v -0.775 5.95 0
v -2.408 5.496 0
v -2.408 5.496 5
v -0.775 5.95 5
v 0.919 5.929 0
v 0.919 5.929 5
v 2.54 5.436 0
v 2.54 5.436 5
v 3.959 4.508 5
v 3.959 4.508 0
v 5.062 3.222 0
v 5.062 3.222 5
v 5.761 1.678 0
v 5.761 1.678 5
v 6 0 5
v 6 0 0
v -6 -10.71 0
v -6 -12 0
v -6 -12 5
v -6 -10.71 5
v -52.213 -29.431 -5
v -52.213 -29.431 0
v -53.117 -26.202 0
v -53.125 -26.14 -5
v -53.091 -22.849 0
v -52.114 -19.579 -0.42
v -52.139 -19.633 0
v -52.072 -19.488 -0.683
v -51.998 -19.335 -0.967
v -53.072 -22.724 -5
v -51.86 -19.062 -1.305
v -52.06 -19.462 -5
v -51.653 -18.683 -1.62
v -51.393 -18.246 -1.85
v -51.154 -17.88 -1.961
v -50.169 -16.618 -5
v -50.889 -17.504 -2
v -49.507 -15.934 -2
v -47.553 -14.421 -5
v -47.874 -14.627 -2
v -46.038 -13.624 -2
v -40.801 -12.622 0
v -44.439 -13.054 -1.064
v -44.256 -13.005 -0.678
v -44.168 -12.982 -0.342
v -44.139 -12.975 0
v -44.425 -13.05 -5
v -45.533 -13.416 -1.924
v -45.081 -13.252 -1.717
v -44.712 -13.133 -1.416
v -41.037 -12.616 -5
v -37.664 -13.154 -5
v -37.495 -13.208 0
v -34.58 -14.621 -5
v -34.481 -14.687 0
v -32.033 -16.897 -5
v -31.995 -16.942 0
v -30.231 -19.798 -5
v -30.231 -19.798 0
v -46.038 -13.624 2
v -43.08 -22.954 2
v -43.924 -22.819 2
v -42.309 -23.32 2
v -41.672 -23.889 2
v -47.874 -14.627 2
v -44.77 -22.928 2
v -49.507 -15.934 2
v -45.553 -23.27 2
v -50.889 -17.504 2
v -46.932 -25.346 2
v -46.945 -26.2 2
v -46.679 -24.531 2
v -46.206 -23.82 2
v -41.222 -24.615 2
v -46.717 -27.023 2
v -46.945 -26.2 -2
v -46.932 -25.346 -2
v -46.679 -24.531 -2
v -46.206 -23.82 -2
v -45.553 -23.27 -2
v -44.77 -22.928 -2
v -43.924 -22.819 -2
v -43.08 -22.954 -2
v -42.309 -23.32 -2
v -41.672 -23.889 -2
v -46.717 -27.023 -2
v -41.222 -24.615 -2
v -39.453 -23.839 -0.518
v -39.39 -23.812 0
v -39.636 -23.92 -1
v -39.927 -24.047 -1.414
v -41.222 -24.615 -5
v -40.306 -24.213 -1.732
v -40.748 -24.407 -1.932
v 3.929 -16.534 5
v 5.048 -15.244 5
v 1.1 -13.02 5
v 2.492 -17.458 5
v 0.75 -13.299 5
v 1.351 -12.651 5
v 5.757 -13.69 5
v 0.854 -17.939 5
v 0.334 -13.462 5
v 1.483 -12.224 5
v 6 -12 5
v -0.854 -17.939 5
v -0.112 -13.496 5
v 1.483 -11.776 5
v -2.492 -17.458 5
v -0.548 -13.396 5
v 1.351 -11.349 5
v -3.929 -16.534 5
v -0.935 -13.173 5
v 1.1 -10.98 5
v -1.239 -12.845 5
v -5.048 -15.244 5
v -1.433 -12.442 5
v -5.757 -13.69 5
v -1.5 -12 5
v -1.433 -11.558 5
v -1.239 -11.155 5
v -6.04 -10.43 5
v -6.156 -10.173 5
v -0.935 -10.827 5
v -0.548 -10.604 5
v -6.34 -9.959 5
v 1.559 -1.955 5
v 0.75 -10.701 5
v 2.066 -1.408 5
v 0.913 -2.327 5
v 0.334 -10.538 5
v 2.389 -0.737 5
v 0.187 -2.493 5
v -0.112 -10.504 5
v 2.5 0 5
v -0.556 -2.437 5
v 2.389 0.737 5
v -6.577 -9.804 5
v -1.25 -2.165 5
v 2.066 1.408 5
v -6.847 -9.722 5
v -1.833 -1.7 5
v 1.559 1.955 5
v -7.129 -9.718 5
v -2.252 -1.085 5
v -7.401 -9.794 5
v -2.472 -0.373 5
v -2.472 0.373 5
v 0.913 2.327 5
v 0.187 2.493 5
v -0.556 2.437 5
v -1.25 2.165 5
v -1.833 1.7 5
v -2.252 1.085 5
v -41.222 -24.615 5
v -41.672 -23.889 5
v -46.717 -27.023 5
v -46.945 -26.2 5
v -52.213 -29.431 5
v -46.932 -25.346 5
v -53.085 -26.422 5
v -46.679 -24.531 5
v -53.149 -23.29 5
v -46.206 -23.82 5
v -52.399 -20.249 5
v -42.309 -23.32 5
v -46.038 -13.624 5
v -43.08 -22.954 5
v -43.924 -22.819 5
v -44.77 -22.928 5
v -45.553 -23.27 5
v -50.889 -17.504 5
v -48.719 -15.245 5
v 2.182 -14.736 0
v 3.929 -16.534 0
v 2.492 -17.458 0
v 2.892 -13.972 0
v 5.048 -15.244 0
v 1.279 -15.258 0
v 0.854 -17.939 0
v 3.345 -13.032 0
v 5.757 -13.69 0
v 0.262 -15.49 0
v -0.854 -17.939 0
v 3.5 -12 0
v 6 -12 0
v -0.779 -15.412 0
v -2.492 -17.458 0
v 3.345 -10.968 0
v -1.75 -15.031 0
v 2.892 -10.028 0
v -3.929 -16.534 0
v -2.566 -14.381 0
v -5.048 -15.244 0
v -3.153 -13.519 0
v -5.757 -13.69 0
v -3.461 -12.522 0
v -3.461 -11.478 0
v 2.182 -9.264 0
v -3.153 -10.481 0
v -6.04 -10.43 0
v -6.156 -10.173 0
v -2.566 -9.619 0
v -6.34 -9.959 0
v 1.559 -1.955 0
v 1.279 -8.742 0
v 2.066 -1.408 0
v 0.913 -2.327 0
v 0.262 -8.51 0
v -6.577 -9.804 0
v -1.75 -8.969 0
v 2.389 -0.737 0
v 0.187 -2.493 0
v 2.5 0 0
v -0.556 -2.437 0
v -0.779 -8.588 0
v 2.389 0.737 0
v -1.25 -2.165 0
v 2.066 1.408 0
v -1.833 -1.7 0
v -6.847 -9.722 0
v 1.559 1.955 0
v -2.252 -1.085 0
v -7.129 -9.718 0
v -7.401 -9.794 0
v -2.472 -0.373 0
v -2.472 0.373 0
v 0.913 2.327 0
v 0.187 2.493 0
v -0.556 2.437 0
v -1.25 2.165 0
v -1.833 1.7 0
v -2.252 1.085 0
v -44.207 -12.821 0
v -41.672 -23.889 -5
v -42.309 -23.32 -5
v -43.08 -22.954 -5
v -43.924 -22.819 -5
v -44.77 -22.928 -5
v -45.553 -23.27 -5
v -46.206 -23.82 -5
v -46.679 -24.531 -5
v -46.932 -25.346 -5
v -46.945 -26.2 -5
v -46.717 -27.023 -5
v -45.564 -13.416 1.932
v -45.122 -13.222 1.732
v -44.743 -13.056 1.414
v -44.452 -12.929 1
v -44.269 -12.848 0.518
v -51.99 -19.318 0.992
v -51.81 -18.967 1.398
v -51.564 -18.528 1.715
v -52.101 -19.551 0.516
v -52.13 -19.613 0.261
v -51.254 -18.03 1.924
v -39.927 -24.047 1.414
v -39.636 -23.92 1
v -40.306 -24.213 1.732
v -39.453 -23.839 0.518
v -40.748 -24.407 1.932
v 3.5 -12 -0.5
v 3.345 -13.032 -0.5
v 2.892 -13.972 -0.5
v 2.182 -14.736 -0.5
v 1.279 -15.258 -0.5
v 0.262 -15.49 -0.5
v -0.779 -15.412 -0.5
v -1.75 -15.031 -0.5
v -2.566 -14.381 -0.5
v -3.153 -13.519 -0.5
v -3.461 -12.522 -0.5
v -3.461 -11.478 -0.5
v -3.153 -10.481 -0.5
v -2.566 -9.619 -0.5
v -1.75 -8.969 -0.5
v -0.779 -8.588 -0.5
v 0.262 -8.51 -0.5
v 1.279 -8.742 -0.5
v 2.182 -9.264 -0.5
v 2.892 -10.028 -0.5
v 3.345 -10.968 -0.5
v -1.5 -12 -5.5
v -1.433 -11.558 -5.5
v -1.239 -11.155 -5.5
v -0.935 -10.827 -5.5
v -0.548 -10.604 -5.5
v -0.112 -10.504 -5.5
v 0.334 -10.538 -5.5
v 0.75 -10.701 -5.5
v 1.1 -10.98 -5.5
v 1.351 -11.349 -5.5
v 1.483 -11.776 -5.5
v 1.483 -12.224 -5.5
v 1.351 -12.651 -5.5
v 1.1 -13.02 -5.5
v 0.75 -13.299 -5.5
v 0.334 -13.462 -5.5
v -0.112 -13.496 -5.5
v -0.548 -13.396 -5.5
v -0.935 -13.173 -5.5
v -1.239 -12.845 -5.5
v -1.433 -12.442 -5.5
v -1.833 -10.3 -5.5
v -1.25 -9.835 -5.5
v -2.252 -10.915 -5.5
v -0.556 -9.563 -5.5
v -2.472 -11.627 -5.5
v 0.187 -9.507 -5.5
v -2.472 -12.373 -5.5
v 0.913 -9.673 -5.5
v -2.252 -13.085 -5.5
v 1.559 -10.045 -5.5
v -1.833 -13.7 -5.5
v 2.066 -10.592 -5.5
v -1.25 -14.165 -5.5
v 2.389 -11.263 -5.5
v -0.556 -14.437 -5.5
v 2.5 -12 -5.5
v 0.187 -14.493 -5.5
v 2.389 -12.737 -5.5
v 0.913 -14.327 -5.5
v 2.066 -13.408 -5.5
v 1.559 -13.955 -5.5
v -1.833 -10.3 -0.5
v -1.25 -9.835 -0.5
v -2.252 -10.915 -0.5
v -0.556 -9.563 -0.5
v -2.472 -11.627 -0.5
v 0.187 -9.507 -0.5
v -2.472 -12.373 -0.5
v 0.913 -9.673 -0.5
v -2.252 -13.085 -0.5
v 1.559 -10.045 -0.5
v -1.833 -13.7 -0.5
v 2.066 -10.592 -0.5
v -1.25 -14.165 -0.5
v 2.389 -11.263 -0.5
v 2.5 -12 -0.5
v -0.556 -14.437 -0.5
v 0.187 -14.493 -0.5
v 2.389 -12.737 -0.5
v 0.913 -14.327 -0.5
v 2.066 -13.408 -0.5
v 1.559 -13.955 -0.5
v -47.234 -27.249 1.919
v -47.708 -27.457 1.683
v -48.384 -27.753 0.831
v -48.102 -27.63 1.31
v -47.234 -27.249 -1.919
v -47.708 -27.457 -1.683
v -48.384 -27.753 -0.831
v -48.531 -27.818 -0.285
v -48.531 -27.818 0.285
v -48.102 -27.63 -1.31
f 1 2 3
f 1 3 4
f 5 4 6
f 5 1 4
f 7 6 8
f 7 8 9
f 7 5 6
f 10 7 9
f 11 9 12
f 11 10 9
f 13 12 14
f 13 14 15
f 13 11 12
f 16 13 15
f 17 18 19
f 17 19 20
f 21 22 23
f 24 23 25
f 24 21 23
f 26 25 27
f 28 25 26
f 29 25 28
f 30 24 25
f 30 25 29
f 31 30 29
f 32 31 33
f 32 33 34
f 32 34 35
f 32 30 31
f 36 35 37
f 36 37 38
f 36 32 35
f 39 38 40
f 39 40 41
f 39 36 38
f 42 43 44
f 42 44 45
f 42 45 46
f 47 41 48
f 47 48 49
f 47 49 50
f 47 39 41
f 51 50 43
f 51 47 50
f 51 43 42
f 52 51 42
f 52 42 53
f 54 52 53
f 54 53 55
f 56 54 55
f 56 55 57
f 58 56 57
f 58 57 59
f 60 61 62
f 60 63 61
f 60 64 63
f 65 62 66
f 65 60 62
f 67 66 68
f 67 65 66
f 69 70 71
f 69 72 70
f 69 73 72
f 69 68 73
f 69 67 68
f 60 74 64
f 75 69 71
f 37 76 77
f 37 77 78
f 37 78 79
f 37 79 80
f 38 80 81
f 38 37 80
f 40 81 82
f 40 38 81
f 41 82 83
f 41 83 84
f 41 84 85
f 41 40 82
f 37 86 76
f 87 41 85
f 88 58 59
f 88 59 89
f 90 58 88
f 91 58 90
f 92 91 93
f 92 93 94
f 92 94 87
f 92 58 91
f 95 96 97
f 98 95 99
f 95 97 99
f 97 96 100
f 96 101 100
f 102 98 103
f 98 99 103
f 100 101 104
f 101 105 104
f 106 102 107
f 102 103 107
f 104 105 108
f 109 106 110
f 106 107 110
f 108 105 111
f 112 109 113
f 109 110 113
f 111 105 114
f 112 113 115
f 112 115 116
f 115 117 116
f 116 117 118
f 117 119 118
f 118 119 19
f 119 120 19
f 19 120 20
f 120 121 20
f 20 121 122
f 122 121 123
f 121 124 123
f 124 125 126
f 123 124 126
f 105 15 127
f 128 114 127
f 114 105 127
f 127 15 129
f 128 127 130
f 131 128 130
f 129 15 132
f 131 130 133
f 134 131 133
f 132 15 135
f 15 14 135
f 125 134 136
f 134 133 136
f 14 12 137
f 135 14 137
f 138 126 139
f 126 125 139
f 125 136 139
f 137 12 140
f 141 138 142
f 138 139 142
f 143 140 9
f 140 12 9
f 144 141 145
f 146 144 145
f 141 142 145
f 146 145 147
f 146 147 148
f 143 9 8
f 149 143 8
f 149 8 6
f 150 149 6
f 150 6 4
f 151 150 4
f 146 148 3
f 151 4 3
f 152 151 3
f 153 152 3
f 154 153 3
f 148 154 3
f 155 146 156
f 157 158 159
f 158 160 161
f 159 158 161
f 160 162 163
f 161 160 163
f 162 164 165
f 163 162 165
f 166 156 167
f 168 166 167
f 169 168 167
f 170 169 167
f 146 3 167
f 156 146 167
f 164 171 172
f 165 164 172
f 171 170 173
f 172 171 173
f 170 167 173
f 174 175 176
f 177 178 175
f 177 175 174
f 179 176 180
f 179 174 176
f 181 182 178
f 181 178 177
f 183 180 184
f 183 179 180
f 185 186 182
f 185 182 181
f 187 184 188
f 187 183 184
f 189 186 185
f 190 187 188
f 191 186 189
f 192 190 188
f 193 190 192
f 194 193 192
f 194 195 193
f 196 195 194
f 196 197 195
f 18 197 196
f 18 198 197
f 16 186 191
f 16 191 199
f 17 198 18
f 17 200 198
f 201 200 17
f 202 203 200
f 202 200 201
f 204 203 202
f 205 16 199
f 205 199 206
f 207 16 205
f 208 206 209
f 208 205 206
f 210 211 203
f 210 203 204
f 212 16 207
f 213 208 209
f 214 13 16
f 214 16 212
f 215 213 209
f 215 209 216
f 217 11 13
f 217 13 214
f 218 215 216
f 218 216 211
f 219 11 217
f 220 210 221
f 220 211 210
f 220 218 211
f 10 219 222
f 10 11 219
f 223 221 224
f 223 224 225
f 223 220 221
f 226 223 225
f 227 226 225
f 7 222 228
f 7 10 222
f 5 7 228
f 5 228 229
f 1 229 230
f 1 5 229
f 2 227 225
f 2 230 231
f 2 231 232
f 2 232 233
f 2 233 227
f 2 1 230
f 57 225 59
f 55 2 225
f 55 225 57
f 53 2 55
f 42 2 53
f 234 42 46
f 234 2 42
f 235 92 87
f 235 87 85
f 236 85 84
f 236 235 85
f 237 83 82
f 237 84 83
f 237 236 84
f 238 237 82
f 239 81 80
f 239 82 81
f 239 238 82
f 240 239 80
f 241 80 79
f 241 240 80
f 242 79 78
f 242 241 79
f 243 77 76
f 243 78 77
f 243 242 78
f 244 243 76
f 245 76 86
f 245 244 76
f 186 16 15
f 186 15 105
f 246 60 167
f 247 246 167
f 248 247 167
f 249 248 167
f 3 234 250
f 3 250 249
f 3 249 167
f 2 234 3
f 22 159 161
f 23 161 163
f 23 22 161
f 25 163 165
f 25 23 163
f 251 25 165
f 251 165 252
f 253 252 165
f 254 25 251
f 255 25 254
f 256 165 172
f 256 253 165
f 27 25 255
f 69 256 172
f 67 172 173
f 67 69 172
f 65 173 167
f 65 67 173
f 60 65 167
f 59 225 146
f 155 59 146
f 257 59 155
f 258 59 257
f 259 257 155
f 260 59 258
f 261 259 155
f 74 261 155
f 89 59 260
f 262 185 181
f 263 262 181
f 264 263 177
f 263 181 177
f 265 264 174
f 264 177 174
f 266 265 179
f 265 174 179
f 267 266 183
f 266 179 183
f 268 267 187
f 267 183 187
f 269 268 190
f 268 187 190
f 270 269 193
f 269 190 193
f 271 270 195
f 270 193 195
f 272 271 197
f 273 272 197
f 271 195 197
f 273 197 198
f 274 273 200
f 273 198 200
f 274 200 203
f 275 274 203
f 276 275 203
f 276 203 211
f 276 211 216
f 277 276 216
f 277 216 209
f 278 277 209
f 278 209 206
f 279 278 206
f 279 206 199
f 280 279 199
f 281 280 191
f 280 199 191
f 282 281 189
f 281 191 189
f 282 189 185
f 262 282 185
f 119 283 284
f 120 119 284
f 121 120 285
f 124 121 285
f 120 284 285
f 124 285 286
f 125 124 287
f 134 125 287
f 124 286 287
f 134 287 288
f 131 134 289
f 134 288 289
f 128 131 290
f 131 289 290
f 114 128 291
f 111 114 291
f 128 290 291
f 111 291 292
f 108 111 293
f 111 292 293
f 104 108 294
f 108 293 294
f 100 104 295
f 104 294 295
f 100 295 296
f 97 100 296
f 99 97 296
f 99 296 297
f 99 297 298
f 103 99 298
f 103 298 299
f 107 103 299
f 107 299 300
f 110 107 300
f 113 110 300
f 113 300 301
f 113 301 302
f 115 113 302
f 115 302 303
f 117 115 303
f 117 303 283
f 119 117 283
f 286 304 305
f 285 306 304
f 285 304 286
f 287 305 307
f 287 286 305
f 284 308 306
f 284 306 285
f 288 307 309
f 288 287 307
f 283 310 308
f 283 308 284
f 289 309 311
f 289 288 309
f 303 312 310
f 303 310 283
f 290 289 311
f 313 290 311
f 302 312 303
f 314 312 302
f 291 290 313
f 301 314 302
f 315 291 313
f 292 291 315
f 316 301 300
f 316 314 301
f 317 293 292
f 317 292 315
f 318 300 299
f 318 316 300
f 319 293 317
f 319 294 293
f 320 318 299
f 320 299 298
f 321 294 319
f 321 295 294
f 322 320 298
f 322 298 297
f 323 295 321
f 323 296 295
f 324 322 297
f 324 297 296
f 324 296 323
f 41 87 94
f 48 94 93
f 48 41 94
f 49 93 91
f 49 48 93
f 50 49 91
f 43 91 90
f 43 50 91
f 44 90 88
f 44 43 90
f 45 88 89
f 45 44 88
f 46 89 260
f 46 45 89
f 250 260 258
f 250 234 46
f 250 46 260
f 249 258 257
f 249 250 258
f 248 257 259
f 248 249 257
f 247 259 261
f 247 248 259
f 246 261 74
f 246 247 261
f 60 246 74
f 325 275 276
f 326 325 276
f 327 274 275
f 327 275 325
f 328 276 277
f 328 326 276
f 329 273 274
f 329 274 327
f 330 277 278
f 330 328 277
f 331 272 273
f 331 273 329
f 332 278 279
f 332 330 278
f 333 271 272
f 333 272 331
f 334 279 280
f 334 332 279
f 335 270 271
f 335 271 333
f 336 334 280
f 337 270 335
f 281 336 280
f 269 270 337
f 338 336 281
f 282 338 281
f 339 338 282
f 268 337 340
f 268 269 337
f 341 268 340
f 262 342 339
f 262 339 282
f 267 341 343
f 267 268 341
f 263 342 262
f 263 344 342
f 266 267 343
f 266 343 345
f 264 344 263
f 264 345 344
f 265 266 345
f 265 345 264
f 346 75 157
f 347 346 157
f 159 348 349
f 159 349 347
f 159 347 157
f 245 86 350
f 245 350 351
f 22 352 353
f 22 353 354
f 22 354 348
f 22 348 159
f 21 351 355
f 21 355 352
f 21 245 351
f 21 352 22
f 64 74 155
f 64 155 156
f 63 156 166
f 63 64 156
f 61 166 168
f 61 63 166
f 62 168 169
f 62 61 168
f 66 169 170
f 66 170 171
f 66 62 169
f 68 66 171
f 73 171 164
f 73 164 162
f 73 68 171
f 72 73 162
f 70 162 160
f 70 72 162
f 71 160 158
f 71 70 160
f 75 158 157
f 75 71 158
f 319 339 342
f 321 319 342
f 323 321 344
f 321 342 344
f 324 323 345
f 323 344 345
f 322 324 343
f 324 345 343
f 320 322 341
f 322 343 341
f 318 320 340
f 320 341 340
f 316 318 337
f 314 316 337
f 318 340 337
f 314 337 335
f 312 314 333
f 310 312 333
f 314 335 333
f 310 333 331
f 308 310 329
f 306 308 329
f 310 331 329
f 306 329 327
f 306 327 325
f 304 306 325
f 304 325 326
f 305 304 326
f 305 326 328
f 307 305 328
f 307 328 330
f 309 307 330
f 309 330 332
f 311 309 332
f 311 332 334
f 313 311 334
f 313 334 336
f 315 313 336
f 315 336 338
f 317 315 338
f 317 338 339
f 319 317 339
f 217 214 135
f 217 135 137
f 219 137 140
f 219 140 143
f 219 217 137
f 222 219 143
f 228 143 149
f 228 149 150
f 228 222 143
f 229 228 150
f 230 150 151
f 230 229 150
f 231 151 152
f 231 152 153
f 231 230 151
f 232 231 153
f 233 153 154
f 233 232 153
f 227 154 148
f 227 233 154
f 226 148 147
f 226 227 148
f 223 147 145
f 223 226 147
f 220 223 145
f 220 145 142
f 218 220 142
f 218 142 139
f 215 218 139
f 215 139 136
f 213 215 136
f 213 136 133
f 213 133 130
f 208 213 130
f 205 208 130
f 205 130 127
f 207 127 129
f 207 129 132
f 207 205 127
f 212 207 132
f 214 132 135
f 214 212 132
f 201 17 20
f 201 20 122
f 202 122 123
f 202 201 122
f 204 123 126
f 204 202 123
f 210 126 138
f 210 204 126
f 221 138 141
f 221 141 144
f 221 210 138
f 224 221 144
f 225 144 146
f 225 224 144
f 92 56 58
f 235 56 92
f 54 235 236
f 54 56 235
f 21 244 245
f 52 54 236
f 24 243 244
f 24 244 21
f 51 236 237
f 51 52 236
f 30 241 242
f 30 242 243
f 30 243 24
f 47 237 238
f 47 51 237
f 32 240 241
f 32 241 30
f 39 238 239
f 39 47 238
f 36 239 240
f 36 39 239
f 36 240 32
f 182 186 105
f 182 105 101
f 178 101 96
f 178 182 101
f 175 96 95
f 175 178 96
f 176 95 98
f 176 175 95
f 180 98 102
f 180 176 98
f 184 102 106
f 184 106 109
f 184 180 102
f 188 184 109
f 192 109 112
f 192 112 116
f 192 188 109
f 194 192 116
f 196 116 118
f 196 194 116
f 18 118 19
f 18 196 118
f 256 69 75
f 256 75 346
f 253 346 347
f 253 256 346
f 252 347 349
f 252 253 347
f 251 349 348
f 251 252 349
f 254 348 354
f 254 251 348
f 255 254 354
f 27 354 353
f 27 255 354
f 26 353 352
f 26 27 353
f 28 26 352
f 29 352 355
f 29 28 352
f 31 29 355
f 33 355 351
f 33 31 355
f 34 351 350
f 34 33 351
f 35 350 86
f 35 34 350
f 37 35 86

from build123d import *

# Parameters (mm, degrees)
ESBO_O7_R                = 2.5
RESSALTO_EXTRUS_O1_DEPTH = 5
ESBO_O8_R                = 2.5
RESSALTO_EXTRUS_O2_DEPTH = 5.5
ESBO_O9_R                = 1.5
CORTE_EXTRUS_O4_DEPTH    = 25
RESSALTO_EXTRUS_O3_START = 5
RESSALTO_EXTRUS_O3_DEPTH = 5
CORTE_EXTRUS_O5_DEPTH    = 16
SKETCH1_R                = 3.5
SKETCH1_R_2              = 2.5
BOSS_EXTRUDE1_DEPTH      = 0.5


with BuildPart() as part:
    # Esboço7 → Ressalto-extrusão1 (new body)
    with BuildSketch(Plane.XY):
        with BuildLine():
            Line((6, 0), (6, -12))
            ThreePointArc((6, -12), (0, -18), (-6, -12))
            Line((-6, -12), (-6, -10.710094321))
            ThreePointArc((-6, -10.710094321), (-6.452901427, -9.873026133), (-7.401366303, -9.794176699))
            Line((-7.401366303, -9.794176699), (-41.221941829, -24.614766505))
            ThreePointArc((-41.221941829, -24.614766505), (-45.173793605, -23.071112549), (-46.717447562, -27.022964325))
            Line((-46.717447562, -27.022964325), (-52.212953295, -29.431162145))
            ThreePointArc((-52.212953295, -29.431162145), (-52.399466586, -20.248653784), (-46.038337469, -13.62375504))
            Line((-46.038337469, -13.62375504), (-2.40819782, 5.495505733))
            ThreePointArc((-2.40819782, 5.495505733), (3.282591437, 5.022409129), (6, 0))
        make_face()
        Circle(ESBO_O7_R, mode=Mode.SUBTRACT)
    extrude(amount=RESSALTO_EXTRUS_O1_DEPTH)

    # Esboço8 → Ressalto-extrusão2 (add)
    with BuildSketch(Plane(origin=(0, 0, 0), x_dir=(-1, 0, 0), z_dir=(0, 0, -1))):
        with Locations(Location((0, -12, 0), (0, 0, 180))):
            Circle(ESBO_O8_R)
    extrude(amount=RESSALTO_EXTRUS_O2_DEPTH)

    # Esboço9 → Corte-extrusão4 (cut)
    with BuildSketch(Plane(origin=(0, 0, -5.5), x_dir=(-1, 0, 0), z_dir=(0, 0, -1))):
        with Locations((0, -12)):
            Circle(ESBO_O9_R)
    extrude(amount=-CORTE_EXTRUS_O4_DEPTH, mode=Mode.SUBTRACT)

    # Esboço10 → Ressalto-extrusão3 (add)
    with BuildSketch(Plane(origin=(0, 0, 0), x_dir=(-1, 0, 0), z_dir=(0, 0, -1)).offset(RESSALTO_EXTRUS_O3_START)):
        with BuildLine():
            Line((46.717447562, -27.022964325), (52.212953295, -29.431162145))
            ThreePointArc((52.212953295, -29.431162145), (46.038337469, -13.62375504), (30.230930363, -19.798370866))
            Line((30.230930363, -19.798370866), (41.221941829, -24.614766505))
            ThreePointArc((41.221941829, -24.614766505), (45.173793605, -23.071112549), (46.717447562, -27.022964325))
        make_face()
    extrude(amount=-RESSALTO_EXTRUS_O3_DEPTH)

    # Esboço11 → Corte-extrusão5 (cut)
    with BuildSketch(Plane(origin=(-2.40819782, 5.495505733, 0), x_dir=(-0.9159176221486778, -0.40136630331595097, 0), z_dir=(-0.40136630331595097, 0.9159176221486778, 0))):
        with BuildLine():
            Line((47.63544078, 2), (53.63544078, 2))
            ThreePointArc((53.63544078, 2), (55.63544078, 0), (53.63544078, -2))
            Line((53.63544078, -2), (47.63544078, -2))
            ThreePointArc((47.63544078, -2), (45.63544078, 0), (47.63544078, 2))
        make_face()
    extrude(amount=-CORTE_EXTRUS_O5_DEPTH, mode=Mode.SUBTRACT)

    # Sketch1 → Boss-Extrude1 (add)
    with BuildSketch(Plane(origin=(0, 0, 0), x_dir=(-1, 0, 0), z_dir=(0, 0, -1))):
        with Locations(Location((0, -12, 0), (0, 0, 180))):
            Circle(SKETCH1_R)
        with Locations((0, -12)):
            Circle(SKETCH1_R_2, mode=Mode.SUBTRACT)
    extrude(amount=BOSS_EXTRUDE1_DEPTH)


solid = part.part
